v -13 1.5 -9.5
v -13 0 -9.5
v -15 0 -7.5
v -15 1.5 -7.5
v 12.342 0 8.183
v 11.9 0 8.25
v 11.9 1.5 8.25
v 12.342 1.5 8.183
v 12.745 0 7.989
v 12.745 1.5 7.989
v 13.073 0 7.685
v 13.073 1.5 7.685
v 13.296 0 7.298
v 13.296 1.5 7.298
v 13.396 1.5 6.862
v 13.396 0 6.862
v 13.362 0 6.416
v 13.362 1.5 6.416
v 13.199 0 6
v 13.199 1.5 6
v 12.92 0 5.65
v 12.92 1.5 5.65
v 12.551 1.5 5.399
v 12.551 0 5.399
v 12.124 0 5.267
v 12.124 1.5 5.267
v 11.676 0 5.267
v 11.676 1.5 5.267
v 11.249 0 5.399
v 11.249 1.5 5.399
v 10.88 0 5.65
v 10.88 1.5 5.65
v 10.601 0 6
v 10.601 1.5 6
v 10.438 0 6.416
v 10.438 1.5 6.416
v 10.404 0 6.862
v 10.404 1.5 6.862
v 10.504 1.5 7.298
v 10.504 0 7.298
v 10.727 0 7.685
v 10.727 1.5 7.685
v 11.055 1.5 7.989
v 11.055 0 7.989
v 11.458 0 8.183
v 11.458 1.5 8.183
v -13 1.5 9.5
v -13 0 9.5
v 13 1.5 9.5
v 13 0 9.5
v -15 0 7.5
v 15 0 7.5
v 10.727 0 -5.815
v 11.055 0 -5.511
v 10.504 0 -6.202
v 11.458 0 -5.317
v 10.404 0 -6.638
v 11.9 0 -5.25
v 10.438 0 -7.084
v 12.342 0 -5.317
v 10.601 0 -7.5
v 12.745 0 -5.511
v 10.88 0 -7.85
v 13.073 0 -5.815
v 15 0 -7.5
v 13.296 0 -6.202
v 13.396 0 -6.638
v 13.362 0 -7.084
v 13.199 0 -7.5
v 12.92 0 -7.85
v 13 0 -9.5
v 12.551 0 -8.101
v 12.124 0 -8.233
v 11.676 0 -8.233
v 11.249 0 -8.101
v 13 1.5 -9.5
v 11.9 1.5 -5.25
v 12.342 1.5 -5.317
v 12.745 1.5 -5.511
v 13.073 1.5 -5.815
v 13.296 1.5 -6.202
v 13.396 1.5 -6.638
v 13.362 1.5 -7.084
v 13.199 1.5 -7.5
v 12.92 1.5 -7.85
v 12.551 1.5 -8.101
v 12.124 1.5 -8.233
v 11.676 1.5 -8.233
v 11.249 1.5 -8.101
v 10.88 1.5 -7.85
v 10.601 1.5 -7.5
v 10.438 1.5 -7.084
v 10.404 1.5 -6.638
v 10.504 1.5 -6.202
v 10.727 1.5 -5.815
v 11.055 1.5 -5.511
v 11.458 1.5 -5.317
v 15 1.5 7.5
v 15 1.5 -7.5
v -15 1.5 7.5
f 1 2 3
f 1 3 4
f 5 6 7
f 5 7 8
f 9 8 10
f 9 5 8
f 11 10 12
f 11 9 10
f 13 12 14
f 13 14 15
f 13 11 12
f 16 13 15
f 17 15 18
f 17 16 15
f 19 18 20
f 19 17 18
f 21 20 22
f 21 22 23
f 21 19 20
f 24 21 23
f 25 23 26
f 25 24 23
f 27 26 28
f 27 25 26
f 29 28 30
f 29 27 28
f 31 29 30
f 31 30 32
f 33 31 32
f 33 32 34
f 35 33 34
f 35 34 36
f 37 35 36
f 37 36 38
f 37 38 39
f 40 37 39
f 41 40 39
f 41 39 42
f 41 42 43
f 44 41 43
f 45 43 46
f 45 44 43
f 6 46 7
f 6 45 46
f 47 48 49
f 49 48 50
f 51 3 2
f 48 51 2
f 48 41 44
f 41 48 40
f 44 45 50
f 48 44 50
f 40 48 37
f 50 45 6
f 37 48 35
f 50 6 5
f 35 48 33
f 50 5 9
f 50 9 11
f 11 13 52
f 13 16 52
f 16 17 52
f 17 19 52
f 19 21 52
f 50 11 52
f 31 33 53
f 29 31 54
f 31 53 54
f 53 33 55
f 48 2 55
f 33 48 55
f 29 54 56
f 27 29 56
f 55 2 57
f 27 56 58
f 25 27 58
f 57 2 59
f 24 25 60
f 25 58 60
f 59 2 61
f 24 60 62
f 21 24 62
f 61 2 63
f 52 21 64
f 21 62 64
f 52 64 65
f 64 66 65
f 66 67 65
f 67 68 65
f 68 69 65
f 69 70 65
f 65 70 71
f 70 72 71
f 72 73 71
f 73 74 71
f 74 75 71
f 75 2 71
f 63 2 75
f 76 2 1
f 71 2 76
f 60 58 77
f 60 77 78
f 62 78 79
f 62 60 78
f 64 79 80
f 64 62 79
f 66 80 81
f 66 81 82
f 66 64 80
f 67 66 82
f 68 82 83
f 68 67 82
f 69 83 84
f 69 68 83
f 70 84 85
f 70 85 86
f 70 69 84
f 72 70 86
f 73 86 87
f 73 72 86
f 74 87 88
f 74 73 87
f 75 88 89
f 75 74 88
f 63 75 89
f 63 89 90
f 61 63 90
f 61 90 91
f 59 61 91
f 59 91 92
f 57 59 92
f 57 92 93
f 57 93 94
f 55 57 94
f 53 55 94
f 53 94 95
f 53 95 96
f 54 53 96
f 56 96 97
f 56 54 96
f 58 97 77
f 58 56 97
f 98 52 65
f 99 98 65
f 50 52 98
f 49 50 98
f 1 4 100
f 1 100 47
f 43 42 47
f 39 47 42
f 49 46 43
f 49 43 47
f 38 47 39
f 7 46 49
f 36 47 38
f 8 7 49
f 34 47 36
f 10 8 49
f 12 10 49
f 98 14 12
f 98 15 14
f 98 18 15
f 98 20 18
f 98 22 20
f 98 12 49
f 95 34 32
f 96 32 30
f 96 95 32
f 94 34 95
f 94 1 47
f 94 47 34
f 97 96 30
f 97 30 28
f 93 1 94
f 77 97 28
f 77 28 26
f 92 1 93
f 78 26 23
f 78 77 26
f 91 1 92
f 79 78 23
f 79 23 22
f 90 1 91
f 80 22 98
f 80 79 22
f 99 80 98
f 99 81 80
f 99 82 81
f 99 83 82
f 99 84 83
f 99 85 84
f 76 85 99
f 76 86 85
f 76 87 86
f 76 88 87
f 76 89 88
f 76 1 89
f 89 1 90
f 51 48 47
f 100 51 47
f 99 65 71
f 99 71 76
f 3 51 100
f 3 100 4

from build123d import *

# Parameters (mm, degrees)
SKETCH_1_W      = 30
SKETCH_1_H      = 19
SKETCH_1_R      = 1.5
EXTRUDE_1_DEPTH = 1.5
CHAMFER_1_SIZE  = 2


with BuildPart() as part:
    # Эскиз1 → Бобышка-Вытянуть1 (new body)
    with BuildSketch(Plane(origin=(0, 0, 0), x_dir=(1, 0, 0), z_dir=(0, 1, 0))):
        Rectangle(SKETCH_1_W, SKETCH_1_H)
        with Locations(Location((11.9, 6.75, 0), (0, 0, 270))):
            Circle(SKETCH_1_R, mode=Mode.SUBTRACT)
        with Locations(Location((11.9, -6.75, 0), (0, 0, 270))):
            Circle(SKETCH_1_R, mode=Mode.SUBTRACT)
    extrude(amount=EXTRUDE_1_DEPTH)

    # Фаска1
    chamfer_1_edges = [part.edges().sort_by_distance(p)[0] for p in [
        (-15, 0.75, -9.5),
        (15, 0.75, -9.5),
        (15, 0.75, 9.5),
        (-15, 0.75, 9.5),
    ]]
    chamfer(chamfer_1_edges, length=CHAMFER_1_SIZE)


solid = part.part
